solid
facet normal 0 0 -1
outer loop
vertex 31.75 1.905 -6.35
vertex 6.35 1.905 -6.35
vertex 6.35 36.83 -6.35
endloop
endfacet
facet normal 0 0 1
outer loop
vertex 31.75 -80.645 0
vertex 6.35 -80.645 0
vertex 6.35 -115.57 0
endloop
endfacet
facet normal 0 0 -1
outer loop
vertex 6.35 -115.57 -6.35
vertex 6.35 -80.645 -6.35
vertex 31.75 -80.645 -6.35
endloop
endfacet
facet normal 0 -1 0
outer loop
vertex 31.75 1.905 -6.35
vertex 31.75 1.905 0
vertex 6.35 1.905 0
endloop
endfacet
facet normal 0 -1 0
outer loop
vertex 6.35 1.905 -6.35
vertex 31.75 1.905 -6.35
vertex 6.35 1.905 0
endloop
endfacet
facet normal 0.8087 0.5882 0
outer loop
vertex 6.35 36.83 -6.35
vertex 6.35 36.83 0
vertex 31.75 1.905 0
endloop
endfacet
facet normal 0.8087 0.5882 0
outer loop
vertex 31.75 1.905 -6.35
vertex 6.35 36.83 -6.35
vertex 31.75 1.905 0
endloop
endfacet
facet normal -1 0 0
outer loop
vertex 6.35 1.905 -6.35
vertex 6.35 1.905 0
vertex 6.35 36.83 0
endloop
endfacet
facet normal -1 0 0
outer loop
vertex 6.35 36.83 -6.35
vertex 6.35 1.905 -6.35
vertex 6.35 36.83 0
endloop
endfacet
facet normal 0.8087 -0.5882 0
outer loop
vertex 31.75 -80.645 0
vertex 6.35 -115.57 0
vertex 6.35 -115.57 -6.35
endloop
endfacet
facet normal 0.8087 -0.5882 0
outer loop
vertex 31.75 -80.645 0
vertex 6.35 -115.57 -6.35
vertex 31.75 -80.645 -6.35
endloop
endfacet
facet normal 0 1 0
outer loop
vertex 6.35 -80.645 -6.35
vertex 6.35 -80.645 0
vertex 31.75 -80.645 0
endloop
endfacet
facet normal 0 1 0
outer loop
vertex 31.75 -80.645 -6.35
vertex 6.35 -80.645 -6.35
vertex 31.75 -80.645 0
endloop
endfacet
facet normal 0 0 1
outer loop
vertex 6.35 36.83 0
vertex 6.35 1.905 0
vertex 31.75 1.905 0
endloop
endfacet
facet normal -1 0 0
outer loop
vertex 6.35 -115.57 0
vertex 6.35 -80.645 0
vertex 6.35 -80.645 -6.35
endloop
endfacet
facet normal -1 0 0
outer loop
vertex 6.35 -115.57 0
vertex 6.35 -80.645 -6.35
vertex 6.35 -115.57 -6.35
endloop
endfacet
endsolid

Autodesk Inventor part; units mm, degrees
ref_plane "YZ Plane" through (0, 0, 0) normal (1, 0, 0) x (0, 1, 0)
ref_plane "XZ Plane" through (0, 0, 0) normal (0, 1, 0) x (-1, 0, 0)
ref_plane "XY Plane" through (0, 0, 0) normal (0, 0, 1) x (1, 0, 0)
ref_plane "Work Plane1" through (0, 0, 0) normal (0, 0, 1) x (1, 0, 0)
sketch "Sketch1" plane through (0, 0, 0) normal (0, 0, 1) x (1, 0, 0)
  line L0 (53.34, 1.905) -> (0, 1.905)
  line L1 (0, -80.645) -> (53.34, -80.645)
  line L2 (6.35, 36.83) -> (0, 36.83)
  line L3 (6.35, -115.57) -> (0, -115.57)
  line L4 (0, 1.905) -> (8.89, 1.905)
  line L5 (0, 1.905) -> (8.89, 1.905)
  line L6 (0, 1.905) -> (8.89, 1.905)
  line L7 (6.35, -80.645) -> (6.35, -115.57)
  line L8 (6.35, -115.57) -> (31.75, -80.645)
  line L9 (31.75, -80.645) -> (6.35, -80.645)
  line L10 (6.35, 36.83) -> (31.75, 1.905)
  line L11 (31.75, 1.905) -> (6.35, 1.905)
  line L12 (6.35, 1.905) -> (6.35, 36.83)
  point P0 (0, 0)
  point P1 (6.35, 1.905)
extrude "Extrusion1" add sketch "Sketch1" against normal blind 6.35
properties part number "supportForFileHanger" material "PET Plastic"
